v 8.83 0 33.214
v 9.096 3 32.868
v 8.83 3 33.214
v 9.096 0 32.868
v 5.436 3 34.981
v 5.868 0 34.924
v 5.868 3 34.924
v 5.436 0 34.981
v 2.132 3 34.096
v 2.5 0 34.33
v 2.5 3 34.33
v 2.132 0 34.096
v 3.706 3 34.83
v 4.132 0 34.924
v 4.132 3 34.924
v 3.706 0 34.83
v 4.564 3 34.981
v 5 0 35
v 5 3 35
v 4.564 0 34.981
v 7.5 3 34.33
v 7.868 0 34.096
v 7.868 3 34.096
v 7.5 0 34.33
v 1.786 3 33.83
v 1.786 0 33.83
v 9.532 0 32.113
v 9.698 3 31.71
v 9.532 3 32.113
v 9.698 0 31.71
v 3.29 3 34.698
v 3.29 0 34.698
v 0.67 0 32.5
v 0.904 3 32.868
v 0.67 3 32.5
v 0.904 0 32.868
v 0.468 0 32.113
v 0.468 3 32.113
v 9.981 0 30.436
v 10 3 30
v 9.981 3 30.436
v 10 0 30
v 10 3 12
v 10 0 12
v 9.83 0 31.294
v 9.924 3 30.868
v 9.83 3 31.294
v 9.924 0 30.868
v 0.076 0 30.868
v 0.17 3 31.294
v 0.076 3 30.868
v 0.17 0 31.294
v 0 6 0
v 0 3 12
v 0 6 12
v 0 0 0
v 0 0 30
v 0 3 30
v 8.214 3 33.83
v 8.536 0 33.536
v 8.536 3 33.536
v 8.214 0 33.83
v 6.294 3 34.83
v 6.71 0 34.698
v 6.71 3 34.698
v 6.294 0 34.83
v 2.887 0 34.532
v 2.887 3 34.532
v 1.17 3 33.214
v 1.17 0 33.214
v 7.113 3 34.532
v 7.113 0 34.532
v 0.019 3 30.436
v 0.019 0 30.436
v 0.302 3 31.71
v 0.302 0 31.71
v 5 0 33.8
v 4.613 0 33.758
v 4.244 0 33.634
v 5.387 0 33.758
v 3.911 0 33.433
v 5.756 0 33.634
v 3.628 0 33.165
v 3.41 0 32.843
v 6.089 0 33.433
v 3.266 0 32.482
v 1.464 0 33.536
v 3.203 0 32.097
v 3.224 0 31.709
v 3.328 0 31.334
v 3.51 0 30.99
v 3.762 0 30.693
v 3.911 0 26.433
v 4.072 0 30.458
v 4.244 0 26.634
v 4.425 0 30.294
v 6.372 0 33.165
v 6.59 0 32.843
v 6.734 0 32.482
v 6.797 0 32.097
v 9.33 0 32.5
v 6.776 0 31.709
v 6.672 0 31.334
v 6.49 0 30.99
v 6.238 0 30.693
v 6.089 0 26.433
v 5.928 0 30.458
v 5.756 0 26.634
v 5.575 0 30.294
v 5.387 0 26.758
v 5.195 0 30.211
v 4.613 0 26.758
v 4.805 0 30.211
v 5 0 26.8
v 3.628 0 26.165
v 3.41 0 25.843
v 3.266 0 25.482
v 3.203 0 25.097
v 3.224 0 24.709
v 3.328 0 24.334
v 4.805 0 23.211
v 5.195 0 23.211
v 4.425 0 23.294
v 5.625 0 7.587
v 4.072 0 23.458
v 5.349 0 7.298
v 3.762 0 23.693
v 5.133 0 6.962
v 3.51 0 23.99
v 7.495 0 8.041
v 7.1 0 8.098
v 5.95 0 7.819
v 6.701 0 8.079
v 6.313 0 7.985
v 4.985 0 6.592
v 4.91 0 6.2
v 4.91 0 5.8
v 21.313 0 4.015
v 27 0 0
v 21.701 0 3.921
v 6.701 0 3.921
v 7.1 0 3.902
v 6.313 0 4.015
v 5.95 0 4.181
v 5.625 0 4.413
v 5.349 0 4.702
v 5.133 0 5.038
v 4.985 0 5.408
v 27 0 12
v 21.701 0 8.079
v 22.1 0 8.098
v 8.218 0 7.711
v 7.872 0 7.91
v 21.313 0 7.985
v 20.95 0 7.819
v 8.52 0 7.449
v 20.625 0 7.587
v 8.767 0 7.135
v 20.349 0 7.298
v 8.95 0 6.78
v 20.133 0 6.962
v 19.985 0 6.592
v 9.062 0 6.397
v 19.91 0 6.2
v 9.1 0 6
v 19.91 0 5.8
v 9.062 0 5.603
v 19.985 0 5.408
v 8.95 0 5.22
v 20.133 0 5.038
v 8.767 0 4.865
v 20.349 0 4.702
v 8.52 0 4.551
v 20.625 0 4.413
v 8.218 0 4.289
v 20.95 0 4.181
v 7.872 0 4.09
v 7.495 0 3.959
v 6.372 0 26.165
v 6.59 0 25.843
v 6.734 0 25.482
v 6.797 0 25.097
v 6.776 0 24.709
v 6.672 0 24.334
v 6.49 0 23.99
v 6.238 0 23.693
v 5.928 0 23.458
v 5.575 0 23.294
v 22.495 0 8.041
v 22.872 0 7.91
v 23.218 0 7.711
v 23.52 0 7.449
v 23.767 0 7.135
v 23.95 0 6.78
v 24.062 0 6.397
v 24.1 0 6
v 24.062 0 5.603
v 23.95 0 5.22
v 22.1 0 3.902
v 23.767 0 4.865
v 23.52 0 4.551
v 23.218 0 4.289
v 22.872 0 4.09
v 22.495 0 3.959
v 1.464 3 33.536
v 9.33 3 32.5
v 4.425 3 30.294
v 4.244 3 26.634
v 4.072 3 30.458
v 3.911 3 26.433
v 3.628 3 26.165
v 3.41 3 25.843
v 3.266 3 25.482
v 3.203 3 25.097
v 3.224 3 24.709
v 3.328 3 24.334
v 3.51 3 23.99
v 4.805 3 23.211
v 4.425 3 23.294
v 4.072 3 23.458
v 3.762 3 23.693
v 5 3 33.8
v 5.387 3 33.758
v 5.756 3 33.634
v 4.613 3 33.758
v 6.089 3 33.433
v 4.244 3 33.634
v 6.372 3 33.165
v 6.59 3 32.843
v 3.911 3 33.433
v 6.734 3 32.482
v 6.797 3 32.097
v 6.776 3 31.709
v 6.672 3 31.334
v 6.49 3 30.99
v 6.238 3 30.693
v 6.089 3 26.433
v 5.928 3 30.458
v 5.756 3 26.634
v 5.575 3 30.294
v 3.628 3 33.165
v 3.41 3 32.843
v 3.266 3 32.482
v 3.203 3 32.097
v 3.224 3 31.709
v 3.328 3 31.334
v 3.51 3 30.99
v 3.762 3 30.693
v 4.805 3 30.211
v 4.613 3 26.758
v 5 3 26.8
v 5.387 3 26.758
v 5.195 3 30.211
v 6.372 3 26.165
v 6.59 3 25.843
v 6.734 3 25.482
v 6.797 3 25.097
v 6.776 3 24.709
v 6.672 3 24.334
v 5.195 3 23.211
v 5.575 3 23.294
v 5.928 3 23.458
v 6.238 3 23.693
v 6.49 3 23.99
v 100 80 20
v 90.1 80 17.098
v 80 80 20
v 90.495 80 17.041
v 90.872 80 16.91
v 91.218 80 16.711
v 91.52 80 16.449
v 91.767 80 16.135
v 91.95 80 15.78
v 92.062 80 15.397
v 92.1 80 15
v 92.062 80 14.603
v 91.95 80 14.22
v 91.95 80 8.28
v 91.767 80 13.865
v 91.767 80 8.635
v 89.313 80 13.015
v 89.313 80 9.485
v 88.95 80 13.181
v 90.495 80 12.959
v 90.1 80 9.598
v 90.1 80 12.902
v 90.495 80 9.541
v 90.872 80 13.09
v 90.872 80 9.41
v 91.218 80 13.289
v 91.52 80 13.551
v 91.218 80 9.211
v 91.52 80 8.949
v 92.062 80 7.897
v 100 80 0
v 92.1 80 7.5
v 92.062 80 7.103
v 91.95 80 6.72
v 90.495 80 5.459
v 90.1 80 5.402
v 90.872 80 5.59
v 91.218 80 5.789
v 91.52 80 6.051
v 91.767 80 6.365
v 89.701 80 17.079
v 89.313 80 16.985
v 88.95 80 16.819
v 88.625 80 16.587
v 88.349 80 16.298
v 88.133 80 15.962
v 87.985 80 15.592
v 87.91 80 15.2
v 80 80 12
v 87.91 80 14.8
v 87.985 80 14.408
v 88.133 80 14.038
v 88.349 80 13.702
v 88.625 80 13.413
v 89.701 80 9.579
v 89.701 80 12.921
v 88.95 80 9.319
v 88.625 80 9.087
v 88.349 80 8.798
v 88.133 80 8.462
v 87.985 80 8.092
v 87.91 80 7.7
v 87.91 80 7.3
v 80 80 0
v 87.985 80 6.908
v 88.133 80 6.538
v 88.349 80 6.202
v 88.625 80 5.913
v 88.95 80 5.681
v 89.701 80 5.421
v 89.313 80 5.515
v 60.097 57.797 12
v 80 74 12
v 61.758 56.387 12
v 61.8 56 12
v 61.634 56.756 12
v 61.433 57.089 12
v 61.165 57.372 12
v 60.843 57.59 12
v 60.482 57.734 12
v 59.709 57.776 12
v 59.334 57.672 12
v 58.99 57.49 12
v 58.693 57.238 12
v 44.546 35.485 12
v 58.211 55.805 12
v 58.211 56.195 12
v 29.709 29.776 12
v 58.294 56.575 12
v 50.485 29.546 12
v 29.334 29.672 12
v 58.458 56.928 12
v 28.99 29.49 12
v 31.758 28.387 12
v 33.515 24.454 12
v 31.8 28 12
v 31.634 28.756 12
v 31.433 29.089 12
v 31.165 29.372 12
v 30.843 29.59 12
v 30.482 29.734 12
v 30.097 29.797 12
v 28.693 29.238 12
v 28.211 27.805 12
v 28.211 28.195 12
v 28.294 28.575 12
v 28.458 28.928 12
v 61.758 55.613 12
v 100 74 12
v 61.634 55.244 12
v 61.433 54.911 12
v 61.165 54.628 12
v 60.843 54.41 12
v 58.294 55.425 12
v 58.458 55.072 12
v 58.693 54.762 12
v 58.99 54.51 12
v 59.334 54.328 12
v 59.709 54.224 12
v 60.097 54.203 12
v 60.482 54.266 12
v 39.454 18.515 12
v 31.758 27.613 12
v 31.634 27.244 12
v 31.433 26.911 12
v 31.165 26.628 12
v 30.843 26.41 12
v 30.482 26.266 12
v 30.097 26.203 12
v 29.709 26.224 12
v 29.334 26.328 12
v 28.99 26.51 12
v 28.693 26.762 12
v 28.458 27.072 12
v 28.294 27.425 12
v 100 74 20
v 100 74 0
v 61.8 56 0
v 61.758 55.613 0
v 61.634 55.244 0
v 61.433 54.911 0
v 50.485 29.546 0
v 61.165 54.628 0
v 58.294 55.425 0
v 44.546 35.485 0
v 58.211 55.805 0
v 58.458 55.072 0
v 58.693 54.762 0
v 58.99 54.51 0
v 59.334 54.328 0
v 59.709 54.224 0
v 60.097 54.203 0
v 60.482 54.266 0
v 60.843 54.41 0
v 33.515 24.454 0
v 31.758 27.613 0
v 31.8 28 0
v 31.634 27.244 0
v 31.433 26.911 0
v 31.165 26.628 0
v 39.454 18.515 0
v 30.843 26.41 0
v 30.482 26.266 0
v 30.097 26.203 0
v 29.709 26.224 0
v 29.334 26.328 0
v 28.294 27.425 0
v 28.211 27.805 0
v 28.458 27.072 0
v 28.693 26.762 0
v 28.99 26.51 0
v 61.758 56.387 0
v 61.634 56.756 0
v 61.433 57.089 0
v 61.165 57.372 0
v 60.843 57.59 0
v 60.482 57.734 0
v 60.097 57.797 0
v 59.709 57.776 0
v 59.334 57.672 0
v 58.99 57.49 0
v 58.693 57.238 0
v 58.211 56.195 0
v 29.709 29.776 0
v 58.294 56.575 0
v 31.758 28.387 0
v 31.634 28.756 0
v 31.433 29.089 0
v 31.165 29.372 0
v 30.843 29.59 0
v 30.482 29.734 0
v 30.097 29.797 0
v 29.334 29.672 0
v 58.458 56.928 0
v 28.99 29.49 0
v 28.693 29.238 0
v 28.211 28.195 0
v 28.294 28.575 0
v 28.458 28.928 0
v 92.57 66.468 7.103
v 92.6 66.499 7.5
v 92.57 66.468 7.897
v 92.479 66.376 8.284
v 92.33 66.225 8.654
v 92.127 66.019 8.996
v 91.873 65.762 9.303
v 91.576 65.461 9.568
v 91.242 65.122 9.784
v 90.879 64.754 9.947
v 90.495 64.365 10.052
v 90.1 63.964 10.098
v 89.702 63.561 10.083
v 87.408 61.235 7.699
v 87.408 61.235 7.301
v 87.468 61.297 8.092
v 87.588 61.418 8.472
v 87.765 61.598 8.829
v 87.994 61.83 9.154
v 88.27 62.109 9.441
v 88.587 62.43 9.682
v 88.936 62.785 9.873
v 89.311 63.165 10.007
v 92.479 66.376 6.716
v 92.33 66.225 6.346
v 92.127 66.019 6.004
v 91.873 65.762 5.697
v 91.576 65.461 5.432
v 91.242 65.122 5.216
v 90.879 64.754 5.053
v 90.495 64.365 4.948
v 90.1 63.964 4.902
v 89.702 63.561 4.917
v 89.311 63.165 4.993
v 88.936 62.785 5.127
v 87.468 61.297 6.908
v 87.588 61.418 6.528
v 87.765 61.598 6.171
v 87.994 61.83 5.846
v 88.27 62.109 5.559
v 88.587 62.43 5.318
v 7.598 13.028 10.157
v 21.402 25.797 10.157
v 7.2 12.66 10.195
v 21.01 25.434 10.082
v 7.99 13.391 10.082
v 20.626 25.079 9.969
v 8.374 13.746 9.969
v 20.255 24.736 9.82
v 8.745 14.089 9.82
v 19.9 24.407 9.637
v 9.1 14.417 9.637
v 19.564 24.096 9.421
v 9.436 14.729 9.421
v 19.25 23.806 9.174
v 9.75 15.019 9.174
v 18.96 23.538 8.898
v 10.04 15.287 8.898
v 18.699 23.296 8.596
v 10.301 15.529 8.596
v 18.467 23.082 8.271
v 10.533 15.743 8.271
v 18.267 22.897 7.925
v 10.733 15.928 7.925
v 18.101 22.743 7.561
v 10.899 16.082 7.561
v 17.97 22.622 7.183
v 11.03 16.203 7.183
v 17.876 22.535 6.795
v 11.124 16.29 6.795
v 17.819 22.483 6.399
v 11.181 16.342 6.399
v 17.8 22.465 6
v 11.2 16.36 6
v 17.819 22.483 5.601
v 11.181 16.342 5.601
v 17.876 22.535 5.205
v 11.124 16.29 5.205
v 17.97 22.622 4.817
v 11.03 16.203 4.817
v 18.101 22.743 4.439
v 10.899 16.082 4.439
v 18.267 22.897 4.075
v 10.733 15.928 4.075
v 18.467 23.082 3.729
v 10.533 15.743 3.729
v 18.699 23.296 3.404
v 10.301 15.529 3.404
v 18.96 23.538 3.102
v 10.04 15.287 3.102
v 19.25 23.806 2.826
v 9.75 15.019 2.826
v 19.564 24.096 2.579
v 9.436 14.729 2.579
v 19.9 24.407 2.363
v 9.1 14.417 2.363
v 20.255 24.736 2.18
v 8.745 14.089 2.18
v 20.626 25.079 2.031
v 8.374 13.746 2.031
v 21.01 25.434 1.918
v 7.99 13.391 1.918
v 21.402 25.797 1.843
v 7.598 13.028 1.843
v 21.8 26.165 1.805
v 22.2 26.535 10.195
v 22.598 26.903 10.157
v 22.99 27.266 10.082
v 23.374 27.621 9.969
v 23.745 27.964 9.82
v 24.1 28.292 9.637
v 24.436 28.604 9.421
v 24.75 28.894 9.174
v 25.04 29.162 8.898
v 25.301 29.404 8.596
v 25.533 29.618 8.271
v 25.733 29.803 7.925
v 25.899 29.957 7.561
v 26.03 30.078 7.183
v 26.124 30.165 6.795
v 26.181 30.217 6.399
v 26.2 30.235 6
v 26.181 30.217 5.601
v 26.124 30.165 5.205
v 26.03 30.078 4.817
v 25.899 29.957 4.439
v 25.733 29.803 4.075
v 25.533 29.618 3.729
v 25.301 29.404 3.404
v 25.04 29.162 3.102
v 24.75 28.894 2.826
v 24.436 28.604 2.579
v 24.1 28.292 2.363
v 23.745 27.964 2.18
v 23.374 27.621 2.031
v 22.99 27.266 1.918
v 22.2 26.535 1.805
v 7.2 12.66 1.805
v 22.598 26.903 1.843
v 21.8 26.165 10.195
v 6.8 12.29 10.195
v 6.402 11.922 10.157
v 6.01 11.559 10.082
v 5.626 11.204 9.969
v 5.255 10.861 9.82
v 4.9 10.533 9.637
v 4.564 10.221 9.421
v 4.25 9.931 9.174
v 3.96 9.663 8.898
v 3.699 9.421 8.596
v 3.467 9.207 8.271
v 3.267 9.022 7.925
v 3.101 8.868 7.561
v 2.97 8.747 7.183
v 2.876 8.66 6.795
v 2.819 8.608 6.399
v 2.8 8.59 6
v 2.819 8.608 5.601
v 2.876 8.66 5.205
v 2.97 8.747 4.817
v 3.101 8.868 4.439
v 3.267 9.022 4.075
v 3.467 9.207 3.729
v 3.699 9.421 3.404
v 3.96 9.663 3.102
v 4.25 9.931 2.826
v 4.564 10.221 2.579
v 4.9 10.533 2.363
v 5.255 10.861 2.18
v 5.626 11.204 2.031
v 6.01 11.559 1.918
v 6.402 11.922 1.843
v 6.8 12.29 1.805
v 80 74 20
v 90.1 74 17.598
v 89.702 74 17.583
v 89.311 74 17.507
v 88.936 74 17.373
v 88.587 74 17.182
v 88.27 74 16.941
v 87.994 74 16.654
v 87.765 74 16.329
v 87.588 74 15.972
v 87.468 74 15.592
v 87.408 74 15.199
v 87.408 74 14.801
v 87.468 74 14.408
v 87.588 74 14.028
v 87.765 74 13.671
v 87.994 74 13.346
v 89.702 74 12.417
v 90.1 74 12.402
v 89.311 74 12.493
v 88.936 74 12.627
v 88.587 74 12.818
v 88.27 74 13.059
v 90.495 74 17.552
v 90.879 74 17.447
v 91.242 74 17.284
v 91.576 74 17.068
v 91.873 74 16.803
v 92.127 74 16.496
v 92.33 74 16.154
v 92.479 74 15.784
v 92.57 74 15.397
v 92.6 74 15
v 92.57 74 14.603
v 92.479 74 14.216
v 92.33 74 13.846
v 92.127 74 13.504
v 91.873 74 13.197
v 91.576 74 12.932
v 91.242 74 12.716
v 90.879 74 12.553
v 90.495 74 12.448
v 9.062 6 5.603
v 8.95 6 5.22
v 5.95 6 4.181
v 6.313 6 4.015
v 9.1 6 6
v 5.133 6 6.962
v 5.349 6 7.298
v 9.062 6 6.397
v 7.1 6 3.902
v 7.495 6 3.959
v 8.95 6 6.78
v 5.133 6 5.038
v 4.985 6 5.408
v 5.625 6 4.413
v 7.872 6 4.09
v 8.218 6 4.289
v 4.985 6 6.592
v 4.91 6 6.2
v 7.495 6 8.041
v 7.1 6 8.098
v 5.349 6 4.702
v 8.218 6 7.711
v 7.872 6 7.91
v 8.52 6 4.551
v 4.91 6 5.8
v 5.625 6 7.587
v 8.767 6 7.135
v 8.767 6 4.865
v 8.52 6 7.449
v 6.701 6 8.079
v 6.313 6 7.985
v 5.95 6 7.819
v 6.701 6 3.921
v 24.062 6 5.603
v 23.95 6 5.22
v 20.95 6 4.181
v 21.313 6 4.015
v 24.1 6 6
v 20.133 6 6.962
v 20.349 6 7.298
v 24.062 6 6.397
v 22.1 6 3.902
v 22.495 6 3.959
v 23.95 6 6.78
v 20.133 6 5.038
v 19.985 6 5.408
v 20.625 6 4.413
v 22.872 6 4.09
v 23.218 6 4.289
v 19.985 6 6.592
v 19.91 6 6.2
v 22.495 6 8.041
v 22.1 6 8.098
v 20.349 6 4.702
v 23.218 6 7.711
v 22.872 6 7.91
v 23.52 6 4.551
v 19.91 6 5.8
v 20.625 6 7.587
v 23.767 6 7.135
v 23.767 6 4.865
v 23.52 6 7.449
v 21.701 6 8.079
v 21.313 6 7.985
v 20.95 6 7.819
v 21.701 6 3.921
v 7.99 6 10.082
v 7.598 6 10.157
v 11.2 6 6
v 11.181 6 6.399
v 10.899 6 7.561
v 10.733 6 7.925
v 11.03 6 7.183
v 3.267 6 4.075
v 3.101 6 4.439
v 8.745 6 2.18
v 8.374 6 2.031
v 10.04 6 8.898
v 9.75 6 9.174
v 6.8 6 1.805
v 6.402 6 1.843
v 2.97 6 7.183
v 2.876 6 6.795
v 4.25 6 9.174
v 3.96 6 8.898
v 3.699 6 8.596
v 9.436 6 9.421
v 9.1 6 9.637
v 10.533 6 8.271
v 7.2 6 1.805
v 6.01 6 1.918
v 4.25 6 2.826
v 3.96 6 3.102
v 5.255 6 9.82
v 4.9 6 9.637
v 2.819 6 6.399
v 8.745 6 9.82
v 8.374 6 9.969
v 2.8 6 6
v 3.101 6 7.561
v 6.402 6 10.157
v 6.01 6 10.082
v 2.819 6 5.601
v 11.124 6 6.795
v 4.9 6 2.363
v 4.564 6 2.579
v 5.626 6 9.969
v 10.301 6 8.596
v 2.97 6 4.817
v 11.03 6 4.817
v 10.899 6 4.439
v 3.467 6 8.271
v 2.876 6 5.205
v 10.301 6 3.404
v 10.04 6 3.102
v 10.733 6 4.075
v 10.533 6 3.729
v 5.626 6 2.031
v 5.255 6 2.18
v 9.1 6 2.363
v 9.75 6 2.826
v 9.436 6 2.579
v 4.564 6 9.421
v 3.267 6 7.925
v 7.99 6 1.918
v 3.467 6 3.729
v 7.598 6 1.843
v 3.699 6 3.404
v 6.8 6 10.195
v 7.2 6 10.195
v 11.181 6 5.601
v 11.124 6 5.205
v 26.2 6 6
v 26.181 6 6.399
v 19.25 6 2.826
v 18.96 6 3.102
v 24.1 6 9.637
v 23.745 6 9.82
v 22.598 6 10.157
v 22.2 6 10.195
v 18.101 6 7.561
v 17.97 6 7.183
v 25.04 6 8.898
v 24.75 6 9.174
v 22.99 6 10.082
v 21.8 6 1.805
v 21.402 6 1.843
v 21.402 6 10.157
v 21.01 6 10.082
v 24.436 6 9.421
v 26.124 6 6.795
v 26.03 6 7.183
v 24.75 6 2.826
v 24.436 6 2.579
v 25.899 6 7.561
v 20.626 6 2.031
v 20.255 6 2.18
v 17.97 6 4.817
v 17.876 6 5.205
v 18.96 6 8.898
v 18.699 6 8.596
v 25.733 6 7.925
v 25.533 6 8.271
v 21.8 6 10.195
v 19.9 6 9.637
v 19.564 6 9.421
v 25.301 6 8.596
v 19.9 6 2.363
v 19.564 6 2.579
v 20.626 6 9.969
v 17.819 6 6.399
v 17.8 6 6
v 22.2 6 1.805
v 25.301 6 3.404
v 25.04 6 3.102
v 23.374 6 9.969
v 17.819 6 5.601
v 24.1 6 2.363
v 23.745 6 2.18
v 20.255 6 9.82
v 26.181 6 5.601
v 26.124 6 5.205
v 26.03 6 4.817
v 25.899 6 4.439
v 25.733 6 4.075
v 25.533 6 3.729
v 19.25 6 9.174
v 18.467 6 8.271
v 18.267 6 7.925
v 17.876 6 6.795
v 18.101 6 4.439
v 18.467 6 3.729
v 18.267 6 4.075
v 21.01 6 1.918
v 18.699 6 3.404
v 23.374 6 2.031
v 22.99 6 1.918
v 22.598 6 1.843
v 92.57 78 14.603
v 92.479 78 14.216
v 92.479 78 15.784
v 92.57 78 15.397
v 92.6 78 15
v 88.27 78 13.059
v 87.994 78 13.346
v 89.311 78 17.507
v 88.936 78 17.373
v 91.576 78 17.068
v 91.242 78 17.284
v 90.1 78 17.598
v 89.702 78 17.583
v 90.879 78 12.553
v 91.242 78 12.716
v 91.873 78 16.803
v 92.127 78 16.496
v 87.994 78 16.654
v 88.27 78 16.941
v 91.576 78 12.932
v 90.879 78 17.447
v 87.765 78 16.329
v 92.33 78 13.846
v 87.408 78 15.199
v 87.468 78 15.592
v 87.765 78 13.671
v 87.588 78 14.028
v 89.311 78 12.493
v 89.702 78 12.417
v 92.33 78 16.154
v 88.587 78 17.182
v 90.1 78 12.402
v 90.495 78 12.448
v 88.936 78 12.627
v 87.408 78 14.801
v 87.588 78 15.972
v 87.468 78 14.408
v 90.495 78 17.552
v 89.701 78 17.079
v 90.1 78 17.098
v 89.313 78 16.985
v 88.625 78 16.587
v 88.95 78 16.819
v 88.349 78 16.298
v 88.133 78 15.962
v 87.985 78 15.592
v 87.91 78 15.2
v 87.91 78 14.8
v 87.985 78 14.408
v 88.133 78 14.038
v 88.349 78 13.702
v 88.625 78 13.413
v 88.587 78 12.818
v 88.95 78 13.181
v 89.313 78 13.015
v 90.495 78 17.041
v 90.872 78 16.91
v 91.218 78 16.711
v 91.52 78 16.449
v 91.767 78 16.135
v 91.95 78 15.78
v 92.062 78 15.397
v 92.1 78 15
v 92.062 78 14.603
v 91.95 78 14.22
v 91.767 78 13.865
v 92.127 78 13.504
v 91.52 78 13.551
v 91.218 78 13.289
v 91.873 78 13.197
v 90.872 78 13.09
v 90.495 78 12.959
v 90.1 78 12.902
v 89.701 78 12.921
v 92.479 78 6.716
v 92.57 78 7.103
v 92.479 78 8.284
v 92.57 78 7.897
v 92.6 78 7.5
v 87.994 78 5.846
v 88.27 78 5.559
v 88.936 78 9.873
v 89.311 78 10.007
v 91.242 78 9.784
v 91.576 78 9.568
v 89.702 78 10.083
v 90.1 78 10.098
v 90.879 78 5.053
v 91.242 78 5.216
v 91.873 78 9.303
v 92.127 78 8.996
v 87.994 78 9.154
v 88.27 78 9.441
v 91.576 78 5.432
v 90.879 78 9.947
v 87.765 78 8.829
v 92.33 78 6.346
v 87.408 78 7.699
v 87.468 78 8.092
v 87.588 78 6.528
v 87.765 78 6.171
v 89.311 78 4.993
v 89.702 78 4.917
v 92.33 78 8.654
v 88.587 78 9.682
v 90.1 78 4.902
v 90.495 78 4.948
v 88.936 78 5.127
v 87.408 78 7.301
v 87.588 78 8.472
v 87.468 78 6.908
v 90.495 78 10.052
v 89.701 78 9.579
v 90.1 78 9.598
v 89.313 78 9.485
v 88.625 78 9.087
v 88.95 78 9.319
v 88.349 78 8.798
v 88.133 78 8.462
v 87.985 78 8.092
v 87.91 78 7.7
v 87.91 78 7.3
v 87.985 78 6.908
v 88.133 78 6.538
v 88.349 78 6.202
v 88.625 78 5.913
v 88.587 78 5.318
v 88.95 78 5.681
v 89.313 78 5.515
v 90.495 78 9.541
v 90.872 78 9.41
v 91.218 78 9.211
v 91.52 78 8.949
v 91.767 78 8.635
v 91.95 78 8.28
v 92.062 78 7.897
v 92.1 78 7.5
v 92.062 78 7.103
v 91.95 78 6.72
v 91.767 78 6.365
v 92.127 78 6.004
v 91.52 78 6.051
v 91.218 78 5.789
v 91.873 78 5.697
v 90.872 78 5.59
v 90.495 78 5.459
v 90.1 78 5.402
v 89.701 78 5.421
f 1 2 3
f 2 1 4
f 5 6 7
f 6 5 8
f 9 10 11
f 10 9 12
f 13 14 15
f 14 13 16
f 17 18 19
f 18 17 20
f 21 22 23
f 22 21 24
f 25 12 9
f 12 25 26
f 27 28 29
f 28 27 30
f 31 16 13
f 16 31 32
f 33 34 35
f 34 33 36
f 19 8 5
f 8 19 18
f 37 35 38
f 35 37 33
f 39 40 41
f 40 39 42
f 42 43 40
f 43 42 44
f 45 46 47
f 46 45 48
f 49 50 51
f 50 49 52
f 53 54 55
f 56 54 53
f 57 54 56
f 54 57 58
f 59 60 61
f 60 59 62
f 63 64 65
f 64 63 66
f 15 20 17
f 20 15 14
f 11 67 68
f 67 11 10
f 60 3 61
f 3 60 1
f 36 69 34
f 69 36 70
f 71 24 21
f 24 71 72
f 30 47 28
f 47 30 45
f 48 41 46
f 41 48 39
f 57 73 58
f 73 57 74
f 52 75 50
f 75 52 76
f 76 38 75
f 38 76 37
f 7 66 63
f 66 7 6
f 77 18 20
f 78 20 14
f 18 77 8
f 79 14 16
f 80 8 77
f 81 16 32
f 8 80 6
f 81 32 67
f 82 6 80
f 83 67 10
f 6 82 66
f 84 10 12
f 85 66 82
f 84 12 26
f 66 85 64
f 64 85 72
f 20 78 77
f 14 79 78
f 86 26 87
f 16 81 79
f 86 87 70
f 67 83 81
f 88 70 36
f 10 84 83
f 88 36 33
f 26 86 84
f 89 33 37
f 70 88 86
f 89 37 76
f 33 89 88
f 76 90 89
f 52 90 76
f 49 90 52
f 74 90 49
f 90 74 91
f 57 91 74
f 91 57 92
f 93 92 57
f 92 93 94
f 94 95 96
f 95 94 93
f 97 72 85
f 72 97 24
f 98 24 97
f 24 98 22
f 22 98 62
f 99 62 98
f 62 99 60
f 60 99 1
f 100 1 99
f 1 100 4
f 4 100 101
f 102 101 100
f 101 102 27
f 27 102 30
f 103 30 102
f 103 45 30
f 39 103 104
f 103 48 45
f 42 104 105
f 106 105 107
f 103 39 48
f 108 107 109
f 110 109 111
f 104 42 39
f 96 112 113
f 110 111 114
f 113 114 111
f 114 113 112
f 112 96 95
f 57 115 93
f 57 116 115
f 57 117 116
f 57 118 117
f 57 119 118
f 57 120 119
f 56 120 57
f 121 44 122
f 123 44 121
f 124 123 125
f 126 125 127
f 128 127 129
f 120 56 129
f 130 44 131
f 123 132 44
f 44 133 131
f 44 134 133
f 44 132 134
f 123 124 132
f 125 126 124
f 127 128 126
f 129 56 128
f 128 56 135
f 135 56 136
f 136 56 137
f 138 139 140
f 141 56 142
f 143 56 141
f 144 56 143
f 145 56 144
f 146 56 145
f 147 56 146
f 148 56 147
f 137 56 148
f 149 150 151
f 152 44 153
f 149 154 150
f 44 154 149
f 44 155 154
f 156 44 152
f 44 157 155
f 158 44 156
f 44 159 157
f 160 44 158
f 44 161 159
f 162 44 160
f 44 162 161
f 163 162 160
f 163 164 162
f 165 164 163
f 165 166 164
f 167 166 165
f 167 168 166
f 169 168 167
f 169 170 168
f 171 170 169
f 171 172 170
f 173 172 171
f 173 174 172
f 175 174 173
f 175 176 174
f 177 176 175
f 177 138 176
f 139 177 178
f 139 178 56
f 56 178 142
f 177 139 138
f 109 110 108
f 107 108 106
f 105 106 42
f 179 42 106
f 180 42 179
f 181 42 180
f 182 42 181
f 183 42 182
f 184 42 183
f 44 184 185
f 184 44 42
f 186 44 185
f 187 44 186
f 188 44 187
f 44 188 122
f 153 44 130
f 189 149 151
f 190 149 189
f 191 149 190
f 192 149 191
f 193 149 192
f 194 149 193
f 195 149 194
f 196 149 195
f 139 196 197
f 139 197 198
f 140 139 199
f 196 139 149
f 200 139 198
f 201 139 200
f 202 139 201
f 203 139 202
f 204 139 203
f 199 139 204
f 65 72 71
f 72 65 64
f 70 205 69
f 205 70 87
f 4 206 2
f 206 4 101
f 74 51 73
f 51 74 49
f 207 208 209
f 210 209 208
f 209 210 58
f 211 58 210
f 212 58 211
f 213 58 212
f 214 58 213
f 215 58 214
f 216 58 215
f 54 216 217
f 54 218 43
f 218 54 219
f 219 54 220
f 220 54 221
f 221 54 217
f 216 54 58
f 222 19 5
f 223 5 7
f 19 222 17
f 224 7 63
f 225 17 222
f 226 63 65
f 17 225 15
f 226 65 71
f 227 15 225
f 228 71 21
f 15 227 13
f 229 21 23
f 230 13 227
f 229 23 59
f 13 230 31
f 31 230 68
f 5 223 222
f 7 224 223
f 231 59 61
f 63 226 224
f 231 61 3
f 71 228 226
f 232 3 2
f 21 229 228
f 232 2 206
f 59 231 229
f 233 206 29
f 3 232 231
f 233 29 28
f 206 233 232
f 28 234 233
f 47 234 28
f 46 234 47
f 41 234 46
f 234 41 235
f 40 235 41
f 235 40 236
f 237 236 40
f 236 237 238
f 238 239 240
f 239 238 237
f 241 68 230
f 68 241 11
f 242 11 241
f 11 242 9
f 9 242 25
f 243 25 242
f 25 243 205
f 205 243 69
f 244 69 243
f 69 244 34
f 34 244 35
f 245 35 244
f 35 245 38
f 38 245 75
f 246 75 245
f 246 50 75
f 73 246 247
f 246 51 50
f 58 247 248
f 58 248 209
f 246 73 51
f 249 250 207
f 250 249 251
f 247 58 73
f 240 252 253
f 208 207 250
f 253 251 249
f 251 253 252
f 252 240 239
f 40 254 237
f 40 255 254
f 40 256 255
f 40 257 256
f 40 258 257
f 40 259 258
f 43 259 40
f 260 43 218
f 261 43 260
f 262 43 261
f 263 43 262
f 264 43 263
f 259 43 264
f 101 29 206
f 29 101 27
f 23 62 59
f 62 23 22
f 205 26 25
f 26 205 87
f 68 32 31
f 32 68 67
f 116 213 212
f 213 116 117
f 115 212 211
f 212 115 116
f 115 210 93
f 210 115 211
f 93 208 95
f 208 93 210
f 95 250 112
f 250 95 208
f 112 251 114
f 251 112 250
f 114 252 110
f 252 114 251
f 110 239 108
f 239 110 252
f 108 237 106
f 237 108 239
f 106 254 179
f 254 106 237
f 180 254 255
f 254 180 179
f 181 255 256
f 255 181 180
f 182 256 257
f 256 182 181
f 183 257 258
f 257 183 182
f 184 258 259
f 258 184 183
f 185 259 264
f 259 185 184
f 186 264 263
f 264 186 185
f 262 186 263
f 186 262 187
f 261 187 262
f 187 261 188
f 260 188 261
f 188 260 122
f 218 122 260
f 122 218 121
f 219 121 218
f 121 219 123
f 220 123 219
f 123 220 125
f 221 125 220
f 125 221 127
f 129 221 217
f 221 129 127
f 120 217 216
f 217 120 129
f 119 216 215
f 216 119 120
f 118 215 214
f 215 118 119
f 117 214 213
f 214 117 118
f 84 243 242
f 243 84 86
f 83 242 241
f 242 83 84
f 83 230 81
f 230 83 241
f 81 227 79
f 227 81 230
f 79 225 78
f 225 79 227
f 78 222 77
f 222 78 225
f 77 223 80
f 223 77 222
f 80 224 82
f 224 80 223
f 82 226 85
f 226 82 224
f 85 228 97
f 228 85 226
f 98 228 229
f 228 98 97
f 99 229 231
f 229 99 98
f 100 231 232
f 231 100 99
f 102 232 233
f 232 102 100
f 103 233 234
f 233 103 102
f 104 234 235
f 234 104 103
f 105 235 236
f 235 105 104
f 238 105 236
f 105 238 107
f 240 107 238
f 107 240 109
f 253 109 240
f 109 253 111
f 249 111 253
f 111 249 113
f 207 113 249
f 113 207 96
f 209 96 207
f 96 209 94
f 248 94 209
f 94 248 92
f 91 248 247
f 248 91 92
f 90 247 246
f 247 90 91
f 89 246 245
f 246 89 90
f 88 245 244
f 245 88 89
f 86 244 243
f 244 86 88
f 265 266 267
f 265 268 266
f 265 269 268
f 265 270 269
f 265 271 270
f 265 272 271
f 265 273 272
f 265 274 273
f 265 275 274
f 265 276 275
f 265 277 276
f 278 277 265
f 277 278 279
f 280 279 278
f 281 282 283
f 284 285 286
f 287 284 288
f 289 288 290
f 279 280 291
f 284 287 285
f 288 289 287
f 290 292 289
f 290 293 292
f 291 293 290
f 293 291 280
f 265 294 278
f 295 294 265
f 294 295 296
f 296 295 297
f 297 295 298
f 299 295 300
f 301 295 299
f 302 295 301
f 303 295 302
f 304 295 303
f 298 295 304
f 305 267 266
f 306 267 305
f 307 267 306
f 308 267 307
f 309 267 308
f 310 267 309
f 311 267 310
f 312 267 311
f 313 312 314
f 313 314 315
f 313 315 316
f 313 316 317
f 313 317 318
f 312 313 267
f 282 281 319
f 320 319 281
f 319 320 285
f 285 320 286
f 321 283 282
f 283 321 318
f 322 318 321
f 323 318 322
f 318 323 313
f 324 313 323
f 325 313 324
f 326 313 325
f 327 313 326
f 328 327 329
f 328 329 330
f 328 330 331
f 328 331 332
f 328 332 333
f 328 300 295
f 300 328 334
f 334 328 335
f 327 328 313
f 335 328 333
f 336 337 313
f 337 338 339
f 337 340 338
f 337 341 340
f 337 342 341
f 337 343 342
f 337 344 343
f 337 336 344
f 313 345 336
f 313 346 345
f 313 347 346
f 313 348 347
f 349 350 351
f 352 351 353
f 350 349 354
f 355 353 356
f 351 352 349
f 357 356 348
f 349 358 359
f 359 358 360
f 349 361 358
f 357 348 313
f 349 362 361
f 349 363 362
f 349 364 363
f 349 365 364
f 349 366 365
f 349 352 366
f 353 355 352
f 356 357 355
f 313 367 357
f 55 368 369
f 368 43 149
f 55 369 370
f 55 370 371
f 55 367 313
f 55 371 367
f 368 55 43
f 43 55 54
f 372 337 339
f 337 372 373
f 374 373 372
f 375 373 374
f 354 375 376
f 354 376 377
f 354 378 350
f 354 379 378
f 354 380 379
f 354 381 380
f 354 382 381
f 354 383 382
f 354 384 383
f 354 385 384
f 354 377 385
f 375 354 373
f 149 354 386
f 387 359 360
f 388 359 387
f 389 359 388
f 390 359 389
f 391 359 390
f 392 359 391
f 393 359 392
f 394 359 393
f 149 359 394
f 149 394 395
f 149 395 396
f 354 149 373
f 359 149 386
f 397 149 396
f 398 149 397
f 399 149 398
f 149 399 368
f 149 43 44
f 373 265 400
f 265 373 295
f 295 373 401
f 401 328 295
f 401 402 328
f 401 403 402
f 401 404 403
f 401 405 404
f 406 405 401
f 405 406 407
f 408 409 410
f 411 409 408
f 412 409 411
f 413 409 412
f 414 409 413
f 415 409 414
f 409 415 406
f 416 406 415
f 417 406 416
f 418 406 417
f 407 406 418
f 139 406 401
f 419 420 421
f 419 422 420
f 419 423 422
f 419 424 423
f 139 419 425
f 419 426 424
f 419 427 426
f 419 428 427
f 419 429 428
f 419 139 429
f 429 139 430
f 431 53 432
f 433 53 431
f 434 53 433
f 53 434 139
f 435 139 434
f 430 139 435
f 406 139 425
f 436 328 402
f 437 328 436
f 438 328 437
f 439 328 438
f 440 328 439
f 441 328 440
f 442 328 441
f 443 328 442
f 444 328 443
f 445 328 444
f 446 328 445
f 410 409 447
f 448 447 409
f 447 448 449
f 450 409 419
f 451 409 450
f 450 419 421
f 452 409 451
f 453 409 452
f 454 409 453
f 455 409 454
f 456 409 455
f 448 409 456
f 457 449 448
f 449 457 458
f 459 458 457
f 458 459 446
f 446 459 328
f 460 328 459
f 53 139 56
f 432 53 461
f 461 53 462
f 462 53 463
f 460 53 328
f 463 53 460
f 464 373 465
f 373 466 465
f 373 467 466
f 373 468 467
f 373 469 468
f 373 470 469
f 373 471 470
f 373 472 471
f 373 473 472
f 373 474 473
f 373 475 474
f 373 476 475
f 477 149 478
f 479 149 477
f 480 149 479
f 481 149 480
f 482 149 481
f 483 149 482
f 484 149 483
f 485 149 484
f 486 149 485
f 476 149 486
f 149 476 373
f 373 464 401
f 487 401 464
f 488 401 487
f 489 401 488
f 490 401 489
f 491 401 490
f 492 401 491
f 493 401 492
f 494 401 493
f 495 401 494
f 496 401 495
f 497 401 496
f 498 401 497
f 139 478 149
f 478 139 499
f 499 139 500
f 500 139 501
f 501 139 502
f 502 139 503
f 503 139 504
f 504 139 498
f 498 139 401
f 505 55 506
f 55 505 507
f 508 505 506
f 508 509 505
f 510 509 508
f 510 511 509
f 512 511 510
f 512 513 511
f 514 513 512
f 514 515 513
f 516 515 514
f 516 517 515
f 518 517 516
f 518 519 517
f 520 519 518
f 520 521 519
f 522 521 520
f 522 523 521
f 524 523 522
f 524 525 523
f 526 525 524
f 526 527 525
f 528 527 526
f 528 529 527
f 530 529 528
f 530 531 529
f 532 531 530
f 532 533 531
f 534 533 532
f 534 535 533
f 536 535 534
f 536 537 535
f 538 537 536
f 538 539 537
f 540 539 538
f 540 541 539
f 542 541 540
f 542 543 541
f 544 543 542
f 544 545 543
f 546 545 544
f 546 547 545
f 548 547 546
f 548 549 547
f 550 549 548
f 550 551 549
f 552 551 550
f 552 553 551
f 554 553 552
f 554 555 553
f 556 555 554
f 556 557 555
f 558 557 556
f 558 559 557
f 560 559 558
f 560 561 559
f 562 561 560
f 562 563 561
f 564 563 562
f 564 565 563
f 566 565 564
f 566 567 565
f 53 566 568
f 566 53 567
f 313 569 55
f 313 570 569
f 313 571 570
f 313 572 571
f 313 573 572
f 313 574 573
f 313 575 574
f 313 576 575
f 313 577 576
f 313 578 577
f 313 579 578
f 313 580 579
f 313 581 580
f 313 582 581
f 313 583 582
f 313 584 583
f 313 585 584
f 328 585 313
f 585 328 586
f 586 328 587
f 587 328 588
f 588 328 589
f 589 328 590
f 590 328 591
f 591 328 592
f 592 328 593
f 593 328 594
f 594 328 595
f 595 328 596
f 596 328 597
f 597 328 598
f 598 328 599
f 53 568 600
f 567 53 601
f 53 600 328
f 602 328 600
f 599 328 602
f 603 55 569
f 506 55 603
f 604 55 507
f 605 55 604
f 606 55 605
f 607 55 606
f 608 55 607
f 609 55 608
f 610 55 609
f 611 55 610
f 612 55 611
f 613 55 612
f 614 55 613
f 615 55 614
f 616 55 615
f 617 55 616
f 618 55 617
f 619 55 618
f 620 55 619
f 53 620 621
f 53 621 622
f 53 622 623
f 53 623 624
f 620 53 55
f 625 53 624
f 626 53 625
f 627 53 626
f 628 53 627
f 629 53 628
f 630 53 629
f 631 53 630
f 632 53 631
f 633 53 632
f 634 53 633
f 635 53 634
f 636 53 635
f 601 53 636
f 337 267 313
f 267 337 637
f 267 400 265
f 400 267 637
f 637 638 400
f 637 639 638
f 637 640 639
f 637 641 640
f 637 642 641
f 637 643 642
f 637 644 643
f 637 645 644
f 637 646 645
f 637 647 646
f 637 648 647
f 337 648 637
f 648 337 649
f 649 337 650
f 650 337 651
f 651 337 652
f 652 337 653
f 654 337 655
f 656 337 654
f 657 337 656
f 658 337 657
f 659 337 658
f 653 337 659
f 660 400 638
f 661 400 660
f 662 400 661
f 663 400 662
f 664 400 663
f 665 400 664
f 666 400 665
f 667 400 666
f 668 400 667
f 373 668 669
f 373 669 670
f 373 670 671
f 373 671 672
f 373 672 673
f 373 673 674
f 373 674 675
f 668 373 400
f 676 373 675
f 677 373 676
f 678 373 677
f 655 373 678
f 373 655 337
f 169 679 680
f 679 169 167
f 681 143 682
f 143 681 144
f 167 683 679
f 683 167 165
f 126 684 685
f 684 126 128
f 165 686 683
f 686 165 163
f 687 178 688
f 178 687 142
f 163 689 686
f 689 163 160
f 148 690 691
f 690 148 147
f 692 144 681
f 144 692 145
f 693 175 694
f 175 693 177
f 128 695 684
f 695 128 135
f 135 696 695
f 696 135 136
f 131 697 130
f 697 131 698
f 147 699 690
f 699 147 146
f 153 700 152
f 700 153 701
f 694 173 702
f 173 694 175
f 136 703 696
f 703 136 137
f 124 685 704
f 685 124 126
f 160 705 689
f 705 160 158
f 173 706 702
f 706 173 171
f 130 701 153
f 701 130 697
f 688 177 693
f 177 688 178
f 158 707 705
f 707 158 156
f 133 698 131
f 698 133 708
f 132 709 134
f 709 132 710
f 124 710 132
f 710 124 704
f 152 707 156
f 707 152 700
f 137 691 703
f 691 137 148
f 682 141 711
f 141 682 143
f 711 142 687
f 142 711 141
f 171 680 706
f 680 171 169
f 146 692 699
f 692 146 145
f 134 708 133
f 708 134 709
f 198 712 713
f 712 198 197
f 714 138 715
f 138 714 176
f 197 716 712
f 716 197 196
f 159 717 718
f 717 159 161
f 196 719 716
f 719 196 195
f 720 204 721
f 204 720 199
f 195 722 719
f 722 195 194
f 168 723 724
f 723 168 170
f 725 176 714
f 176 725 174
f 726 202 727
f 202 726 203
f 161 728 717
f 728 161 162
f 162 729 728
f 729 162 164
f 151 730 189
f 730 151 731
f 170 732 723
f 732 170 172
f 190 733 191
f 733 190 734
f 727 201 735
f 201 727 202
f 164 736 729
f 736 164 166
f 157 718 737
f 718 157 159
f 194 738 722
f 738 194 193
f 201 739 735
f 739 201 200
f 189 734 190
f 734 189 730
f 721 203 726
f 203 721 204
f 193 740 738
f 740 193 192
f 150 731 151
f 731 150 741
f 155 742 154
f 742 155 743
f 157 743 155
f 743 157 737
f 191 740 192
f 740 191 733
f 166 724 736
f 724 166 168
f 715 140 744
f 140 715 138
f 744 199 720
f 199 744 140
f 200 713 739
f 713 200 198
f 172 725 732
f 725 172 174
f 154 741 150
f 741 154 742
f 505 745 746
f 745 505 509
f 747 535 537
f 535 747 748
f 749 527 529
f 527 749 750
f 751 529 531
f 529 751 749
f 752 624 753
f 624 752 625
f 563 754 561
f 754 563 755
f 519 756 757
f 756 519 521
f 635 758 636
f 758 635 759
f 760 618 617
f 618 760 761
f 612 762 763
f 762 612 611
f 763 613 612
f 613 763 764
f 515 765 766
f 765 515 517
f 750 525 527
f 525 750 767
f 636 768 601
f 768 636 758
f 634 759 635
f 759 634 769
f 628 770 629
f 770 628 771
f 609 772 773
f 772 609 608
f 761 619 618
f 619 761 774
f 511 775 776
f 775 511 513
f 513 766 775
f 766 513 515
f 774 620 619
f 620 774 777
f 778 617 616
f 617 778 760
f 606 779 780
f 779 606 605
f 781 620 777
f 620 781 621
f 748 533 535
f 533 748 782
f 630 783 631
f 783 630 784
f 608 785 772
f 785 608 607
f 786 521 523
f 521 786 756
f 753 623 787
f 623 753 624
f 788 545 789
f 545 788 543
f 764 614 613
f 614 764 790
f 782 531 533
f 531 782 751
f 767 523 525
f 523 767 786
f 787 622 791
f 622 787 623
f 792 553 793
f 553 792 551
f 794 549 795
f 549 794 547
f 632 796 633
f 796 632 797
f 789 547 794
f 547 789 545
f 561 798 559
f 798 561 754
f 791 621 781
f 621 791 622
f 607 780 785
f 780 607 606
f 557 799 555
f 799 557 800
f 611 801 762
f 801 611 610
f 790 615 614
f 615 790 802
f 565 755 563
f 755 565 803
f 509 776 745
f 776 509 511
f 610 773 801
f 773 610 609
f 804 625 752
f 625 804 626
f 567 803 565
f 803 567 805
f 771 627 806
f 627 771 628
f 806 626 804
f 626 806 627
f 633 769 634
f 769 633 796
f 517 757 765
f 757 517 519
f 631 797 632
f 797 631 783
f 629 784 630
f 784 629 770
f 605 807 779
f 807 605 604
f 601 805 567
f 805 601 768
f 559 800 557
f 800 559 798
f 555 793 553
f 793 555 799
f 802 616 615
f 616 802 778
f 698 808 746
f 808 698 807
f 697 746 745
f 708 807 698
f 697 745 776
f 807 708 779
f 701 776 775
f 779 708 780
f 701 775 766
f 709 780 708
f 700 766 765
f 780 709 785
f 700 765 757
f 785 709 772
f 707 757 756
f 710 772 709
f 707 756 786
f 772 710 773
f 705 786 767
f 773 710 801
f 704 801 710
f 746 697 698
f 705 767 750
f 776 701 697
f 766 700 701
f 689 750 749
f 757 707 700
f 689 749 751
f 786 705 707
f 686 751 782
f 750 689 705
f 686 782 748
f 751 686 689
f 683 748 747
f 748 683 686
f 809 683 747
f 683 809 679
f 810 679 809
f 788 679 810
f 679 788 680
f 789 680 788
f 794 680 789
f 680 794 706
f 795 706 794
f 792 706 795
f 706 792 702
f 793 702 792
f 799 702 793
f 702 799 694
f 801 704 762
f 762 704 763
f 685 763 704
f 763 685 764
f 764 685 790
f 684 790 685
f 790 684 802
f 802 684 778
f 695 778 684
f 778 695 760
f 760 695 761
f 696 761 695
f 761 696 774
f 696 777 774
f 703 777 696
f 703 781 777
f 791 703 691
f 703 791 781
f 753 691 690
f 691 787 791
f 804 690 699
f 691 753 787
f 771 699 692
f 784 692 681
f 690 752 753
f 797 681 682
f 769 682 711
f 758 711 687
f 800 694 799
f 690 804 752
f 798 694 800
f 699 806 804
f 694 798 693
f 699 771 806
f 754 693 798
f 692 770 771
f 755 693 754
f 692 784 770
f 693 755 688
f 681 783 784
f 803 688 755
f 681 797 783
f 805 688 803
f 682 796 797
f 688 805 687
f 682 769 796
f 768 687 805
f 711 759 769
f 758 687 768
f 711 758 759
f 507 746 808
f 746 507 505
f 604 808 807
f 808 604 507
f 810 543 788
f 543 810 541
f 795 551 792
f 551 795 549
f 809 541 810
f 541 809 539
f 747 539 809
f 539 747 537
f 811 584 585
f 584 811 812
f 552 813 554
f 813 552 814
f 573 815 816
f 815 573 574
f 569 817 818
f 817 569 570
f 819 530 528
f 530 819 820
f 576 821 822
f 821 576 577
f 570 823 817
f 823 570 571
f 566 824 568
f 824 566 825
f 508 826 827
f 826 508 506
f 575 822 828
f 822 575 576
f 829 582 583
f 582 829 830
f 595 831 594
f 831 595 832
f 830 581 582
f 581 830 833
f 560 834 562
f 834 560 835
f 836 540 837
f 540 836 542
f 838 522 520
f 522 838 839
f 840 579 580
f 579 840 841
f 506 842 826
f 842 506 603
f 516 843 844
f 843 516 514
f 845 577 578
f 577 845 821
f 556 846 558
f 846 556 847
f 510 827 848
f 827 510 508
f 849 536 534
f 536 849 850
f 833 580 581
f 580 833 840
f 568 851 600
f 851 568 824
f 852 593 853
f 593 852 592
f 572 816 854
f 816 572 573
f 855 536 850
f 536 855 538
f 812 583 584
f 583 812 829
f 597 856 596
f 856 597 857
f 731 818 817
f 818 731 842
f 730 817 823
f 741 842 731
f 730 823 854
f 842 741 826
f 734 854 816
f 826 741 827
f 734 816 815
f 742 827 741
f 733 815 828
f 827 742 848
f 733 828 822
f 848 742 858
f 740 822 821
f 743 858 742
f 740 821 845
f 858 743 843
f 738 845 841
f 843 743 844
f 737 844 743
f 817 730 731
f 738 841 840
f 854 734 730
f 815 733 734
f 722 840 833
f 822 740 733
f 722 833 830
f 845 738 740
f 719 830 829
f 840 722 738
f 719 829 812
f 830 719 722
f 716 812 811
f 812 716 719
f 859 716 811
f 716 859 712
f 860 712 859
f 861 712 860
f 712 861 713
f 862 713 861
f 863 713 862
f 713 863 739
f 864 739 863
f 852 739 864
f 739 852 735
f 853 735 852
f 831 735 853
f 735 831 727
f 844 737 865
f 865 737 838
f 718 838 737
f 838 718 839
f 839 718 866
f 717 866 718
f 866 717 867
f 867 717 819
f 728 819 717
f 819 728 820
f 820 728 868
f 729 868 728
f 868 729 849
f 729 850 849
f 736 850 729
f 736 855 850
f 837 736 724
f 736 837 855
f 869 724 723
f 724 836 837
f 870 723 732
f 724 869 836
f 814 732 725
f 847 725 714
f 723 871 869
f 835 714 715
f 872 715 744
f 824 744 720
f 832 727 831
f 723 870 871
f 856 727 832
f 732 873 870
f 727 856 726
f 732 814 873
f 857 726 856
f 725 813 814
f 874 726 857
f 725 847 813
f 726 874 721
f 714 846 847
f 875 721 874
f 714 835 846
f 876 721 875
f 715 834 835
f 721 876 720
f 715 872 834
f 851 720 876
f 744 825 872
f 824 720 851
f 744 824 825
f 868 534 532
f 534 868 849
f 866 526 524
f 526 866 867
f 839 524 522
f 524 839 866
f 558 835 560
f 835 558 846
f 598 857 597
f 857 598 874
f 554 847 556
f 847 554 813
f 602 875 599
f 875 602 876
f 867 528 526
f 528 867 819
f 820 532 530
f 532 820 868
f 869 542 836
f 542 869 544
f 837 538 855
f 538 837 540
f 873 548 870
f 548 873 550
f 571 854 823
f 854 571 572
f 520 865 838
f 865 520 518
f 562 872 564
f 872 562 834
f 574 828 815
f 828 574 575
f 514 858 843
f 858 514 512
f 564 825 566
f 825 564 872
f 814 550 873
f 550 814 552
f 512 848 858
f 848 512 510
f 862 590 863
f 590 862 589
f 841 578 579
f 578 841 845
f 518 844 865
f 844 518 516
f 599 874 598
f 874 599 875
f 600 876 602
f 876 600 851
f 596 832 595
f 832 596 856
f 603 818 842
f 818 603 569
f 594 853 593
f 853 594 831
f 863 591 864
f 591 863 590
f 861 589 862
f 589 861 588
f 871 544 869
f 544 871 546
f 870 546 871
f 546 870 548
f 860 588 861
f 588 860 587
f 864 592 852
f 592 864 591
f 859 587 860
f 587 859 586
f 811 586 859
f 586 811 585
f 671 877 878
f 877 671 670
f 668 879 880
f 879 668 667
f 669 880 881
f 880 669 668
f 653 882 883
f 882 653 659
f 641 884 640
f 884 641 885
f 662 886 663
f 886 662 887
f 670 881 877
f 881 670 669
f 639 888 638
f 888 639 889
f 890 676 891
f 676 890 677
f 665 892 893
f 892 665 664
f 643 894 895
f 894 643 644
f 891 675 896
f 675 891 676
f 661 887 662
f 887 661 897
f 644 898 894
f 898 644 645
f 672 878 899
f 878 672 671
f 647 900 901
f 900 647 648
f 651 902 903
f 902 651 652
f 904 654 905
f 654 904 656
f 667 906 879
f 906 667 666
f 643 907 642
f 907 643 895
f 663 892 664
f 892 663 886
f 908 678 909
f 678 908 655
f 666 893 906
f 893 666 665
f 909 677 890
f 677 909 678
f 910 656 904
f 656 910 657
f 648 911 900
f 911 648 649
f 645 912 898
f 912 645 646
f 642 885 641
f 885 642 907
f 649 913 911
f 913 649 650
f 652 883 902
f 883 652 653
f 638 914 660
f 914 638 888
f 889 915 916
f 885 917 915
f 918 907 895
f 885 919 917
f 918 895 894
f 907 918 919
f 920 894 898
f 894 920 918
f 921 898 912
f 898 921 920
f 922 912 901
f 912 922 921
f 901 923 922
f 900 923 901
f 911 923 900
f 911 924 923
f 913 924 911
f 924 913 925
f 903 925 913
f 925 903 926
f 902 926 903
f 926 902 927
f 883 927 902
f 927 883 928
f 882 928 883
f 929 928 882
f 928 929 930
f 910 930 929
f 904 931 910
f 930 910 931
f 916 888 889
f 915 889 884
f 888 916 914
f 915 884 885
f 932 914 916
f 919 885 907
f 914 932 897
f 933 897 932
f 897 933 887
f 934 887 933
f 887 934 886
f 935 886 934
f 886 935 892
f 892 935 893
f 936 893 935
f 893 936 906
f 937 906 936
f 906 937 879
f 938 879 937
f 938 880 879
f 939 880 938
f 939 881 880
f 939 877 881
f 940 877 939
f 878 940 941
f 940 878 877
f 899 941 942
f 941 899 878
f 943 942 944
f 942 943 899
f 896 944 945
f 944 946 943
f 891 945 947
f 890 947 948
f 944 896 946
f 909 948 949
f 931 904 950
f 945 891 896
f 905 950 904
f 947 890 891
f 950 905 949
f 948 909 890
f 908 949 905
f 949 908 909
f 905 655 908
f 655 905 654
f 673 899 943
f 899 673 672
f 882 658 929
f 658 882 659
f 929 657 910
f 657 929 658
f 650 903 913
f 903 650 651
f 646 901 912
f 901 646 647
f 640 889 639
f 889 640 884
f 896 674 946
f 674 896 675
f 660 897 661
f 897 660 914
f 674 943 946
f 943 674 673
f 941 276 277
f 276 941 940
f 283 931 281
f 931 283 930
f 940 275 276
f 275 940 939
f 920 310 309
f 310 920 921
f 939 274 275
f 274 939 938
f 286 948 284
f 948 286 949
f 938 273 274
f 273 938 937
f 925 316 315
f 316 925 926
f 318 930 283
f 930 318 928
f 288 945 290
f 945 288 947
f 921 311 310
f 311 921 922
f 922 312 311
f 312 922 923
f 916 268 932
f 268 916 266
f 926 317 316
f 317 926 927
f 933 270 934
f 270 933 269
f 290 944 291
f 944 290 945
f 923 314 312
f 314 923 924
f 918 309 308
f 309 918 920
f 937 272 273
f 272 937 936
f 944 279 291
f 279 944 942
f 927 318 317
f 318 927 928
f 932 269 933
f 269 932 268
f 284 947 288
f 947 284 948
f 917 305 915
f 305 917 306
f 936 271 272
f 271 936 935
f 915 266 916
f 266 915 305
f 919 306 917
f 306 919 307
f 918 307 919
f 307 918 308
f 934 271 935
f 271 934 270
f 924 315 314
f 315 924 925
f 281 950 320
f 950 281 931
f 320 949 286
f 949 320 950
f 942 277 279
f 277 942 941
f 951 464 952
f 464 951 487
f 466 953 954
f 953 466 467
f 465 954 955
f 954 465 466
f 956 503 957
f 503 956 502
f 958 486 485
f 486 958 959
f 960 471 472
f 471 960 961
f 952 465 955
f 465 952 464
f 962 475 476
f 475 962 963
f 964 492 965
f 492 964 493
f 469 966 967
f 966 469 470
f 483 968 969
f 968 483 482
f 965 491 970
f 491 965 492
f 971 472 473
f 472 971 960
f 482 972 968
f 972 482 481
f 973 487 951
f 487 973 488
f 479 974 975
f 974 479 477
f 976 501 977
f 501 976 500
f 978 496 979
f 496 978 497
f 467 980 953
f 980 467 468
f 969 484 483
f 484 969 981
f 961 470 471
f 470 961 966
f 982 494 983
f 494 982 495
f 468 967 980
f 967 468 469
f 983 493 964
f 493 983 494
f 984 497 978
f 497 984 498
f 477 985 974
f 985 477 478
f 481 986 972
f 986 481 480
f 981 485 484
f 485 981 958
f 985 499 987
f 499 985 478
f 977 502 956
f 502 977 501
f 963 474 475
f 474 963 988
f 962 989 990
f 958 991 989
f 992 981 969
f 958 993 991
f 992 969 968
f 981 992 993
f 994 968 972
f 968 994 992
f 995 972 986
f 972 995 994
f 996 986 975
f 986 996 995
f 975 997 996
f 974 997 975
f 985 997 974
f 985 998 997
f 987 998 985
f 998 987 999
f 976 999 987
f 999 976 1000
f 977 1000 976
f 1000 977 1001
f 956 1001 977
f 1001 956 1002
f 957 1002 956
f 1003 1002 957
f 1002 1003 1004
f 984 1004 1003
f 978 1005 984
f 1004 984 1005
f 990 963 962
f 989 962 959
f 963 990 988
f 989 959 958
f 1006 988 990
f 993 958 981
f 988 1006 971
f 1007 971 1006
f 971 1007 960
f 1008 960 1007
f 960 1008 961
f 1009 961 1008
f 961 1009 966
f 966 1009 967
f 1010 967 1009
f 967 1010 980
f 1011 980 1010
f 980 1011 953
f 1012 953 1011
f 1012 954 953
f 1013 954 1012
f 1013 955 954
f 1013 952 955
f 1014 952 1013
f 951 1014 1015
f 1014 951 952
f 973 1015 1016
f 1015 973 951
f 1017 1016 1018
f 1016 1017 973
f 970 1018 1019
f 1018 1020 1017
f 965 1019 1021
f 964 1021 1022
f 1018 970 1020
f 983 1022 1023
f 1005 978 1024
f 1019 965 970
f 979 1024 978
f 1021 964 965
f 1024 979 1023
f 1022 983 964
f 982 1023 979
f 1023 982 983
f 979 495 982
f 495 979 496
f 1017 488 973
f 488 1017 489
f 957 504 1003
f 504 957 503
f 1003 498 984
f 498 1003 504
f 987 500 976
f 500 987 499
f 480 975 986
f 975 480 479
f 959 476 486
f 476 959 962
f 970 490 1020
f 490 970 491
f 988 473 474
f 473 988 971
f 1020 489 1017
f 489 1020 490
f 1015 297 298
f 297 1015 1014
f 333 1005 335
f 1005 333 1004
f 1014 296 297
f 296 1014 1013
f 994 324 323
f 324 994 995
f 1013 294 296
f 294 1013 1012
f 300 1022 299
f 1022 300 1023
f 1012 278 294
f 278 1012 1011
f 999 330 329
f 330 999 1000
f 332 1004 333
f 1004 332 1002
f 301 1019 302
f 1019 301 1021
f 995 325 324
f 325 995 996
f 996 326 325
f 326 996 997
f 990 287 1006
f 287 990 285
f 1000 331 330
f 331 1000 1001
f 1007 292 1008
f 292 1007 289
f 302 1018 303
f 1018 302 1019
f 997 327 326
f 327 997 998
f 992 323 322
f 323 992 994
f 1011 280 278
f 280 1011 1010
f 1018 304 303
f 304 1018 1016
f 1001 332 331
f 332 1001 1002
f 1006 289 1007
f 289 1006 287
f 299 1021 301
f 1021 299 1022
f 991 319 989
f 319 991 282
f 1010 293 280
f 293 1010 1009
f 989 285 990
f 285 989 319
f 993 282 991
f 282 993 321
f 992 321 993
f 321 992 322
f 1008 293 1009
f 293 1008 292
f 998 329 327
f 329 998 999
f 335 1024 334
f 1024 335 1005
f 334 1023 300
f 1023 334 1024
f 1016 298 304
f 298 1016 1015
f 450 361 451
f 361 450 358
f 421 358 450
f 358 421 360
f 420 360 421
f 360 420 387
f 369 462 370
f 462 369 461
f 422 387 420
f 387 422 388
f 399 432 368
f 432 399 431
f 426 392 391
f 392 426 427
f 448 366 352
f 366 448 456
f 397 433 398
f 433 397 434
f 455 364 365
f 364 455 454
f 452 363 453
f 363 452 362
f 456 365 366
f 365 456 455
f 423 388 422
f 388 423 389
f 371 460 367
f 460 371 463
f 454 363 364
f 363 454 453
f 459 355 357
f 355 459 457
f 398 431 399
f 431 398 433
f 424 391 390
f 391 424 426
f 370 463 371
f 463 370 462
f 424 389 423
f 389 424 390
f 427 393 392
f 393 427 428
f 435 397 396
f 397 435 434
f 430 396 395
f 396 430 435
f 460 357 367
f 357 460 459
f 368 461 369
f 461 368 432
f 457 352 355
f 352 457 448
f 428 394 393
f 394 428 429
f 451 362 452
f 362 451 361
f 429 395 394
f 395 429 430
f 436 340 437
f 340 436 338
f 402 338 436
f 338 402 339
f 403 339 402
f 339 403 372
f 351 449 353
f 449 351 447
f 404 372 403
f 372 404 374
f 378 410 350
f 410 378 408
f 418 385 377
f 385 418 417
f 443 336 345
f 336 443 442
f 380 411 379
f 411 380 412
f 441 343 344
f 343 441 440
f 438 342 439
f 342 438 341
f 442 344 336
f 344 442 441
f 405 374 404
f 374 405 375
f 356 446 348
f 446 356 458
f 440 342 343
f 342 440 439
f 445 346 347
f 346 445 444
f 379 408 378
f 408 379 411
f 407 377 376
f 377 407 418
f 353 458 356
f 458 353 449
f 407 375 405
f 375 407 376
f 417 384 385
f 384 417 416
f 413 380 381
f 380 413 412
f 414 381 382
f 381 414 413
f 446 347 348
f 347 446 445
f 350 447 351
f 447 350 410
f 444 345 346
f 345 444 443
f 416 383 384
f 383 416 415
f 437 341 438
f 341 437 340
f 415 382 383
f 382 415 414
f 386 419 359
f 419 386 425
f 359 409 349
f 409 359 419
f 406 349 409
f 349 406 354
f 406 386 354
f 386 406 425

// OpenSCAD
//$fn=60;
$fa=5;
$fs=.4;


difference(){
    body();
    z_mountig_holes();
    cable_mounting_holes();
    other_zip_holes();
    xt60_hole();
}

module body(){
    linear_extrude(height=12) polygon(points=[
        [0,0],[27,0],[80+20,80-6],
        [80+20,80],[80,80],[0,6]
    ]);

    translate([80,80-6]) linear_extrude(height=20) square([20,6]);  
  
    linear_extrude(height=23) square([10,3]);  
    
    translate([0,0,23]) rotate([0,-90,-90]) zip_bracket();
}

module zip_bracket(){
    difference(){
        linear_extrude(height=3){
            square([7,10],center=false);
            translate([7,5]) circle(d=10);
        }
        translate([0,0,-1]) linear_extrude(height=5){
            translate([2,5]) circle(d=3.6);
            translate([9,5]) circle(d=3.6);
        }
    }
}

module z_mountig_holes(){
    translate([7,-1,6]){
    rotate([-90,0,0]) linear_extrude(height=40) circle(d=4.2);
    translate([15,0,0]) rotate([-90,0,0]) linear_extrude(height=40) circle(d=4.2);
    }
    translate([7,6,6]){
    rotate([-90,0,0]) linear_extrude(height=40) circle(d=8.4);
    translate([15,0,0]) rotate([-90,0,0]) linear_extrude(height=40) circle(d=8.4);
    }
}

module cable_mounting_holes(){
    m4_insert_hole(90,80-2,20-5);
    m4_insert_hole(90,80-2,20-5-7.5);
}

module m4_insert_hole(x=0,y=0,z=0){
    translate([x,y,z]) rotate([-90,0,0]){
        translate([0,0,-20]) linear_extrude(height=20){
            circle(d=5.2);
        }
        translate([0,0,0]) linear_extrude(height=20){
            circle(d=4.2);
        }
    }
} 

module other_zip_holes(){
    translate([30,28,-1]) linear_extrude(height=30) circle(d=3.6);
    translate([60,56,-1]) linear_extrude(height=30) circle(d=3.6);
}

module xt60_hole(){
    translate([42,27,-1]) rotate([0,0,45]) linear_extrude(height=20) square([15.6,8.4],center=true);
}
